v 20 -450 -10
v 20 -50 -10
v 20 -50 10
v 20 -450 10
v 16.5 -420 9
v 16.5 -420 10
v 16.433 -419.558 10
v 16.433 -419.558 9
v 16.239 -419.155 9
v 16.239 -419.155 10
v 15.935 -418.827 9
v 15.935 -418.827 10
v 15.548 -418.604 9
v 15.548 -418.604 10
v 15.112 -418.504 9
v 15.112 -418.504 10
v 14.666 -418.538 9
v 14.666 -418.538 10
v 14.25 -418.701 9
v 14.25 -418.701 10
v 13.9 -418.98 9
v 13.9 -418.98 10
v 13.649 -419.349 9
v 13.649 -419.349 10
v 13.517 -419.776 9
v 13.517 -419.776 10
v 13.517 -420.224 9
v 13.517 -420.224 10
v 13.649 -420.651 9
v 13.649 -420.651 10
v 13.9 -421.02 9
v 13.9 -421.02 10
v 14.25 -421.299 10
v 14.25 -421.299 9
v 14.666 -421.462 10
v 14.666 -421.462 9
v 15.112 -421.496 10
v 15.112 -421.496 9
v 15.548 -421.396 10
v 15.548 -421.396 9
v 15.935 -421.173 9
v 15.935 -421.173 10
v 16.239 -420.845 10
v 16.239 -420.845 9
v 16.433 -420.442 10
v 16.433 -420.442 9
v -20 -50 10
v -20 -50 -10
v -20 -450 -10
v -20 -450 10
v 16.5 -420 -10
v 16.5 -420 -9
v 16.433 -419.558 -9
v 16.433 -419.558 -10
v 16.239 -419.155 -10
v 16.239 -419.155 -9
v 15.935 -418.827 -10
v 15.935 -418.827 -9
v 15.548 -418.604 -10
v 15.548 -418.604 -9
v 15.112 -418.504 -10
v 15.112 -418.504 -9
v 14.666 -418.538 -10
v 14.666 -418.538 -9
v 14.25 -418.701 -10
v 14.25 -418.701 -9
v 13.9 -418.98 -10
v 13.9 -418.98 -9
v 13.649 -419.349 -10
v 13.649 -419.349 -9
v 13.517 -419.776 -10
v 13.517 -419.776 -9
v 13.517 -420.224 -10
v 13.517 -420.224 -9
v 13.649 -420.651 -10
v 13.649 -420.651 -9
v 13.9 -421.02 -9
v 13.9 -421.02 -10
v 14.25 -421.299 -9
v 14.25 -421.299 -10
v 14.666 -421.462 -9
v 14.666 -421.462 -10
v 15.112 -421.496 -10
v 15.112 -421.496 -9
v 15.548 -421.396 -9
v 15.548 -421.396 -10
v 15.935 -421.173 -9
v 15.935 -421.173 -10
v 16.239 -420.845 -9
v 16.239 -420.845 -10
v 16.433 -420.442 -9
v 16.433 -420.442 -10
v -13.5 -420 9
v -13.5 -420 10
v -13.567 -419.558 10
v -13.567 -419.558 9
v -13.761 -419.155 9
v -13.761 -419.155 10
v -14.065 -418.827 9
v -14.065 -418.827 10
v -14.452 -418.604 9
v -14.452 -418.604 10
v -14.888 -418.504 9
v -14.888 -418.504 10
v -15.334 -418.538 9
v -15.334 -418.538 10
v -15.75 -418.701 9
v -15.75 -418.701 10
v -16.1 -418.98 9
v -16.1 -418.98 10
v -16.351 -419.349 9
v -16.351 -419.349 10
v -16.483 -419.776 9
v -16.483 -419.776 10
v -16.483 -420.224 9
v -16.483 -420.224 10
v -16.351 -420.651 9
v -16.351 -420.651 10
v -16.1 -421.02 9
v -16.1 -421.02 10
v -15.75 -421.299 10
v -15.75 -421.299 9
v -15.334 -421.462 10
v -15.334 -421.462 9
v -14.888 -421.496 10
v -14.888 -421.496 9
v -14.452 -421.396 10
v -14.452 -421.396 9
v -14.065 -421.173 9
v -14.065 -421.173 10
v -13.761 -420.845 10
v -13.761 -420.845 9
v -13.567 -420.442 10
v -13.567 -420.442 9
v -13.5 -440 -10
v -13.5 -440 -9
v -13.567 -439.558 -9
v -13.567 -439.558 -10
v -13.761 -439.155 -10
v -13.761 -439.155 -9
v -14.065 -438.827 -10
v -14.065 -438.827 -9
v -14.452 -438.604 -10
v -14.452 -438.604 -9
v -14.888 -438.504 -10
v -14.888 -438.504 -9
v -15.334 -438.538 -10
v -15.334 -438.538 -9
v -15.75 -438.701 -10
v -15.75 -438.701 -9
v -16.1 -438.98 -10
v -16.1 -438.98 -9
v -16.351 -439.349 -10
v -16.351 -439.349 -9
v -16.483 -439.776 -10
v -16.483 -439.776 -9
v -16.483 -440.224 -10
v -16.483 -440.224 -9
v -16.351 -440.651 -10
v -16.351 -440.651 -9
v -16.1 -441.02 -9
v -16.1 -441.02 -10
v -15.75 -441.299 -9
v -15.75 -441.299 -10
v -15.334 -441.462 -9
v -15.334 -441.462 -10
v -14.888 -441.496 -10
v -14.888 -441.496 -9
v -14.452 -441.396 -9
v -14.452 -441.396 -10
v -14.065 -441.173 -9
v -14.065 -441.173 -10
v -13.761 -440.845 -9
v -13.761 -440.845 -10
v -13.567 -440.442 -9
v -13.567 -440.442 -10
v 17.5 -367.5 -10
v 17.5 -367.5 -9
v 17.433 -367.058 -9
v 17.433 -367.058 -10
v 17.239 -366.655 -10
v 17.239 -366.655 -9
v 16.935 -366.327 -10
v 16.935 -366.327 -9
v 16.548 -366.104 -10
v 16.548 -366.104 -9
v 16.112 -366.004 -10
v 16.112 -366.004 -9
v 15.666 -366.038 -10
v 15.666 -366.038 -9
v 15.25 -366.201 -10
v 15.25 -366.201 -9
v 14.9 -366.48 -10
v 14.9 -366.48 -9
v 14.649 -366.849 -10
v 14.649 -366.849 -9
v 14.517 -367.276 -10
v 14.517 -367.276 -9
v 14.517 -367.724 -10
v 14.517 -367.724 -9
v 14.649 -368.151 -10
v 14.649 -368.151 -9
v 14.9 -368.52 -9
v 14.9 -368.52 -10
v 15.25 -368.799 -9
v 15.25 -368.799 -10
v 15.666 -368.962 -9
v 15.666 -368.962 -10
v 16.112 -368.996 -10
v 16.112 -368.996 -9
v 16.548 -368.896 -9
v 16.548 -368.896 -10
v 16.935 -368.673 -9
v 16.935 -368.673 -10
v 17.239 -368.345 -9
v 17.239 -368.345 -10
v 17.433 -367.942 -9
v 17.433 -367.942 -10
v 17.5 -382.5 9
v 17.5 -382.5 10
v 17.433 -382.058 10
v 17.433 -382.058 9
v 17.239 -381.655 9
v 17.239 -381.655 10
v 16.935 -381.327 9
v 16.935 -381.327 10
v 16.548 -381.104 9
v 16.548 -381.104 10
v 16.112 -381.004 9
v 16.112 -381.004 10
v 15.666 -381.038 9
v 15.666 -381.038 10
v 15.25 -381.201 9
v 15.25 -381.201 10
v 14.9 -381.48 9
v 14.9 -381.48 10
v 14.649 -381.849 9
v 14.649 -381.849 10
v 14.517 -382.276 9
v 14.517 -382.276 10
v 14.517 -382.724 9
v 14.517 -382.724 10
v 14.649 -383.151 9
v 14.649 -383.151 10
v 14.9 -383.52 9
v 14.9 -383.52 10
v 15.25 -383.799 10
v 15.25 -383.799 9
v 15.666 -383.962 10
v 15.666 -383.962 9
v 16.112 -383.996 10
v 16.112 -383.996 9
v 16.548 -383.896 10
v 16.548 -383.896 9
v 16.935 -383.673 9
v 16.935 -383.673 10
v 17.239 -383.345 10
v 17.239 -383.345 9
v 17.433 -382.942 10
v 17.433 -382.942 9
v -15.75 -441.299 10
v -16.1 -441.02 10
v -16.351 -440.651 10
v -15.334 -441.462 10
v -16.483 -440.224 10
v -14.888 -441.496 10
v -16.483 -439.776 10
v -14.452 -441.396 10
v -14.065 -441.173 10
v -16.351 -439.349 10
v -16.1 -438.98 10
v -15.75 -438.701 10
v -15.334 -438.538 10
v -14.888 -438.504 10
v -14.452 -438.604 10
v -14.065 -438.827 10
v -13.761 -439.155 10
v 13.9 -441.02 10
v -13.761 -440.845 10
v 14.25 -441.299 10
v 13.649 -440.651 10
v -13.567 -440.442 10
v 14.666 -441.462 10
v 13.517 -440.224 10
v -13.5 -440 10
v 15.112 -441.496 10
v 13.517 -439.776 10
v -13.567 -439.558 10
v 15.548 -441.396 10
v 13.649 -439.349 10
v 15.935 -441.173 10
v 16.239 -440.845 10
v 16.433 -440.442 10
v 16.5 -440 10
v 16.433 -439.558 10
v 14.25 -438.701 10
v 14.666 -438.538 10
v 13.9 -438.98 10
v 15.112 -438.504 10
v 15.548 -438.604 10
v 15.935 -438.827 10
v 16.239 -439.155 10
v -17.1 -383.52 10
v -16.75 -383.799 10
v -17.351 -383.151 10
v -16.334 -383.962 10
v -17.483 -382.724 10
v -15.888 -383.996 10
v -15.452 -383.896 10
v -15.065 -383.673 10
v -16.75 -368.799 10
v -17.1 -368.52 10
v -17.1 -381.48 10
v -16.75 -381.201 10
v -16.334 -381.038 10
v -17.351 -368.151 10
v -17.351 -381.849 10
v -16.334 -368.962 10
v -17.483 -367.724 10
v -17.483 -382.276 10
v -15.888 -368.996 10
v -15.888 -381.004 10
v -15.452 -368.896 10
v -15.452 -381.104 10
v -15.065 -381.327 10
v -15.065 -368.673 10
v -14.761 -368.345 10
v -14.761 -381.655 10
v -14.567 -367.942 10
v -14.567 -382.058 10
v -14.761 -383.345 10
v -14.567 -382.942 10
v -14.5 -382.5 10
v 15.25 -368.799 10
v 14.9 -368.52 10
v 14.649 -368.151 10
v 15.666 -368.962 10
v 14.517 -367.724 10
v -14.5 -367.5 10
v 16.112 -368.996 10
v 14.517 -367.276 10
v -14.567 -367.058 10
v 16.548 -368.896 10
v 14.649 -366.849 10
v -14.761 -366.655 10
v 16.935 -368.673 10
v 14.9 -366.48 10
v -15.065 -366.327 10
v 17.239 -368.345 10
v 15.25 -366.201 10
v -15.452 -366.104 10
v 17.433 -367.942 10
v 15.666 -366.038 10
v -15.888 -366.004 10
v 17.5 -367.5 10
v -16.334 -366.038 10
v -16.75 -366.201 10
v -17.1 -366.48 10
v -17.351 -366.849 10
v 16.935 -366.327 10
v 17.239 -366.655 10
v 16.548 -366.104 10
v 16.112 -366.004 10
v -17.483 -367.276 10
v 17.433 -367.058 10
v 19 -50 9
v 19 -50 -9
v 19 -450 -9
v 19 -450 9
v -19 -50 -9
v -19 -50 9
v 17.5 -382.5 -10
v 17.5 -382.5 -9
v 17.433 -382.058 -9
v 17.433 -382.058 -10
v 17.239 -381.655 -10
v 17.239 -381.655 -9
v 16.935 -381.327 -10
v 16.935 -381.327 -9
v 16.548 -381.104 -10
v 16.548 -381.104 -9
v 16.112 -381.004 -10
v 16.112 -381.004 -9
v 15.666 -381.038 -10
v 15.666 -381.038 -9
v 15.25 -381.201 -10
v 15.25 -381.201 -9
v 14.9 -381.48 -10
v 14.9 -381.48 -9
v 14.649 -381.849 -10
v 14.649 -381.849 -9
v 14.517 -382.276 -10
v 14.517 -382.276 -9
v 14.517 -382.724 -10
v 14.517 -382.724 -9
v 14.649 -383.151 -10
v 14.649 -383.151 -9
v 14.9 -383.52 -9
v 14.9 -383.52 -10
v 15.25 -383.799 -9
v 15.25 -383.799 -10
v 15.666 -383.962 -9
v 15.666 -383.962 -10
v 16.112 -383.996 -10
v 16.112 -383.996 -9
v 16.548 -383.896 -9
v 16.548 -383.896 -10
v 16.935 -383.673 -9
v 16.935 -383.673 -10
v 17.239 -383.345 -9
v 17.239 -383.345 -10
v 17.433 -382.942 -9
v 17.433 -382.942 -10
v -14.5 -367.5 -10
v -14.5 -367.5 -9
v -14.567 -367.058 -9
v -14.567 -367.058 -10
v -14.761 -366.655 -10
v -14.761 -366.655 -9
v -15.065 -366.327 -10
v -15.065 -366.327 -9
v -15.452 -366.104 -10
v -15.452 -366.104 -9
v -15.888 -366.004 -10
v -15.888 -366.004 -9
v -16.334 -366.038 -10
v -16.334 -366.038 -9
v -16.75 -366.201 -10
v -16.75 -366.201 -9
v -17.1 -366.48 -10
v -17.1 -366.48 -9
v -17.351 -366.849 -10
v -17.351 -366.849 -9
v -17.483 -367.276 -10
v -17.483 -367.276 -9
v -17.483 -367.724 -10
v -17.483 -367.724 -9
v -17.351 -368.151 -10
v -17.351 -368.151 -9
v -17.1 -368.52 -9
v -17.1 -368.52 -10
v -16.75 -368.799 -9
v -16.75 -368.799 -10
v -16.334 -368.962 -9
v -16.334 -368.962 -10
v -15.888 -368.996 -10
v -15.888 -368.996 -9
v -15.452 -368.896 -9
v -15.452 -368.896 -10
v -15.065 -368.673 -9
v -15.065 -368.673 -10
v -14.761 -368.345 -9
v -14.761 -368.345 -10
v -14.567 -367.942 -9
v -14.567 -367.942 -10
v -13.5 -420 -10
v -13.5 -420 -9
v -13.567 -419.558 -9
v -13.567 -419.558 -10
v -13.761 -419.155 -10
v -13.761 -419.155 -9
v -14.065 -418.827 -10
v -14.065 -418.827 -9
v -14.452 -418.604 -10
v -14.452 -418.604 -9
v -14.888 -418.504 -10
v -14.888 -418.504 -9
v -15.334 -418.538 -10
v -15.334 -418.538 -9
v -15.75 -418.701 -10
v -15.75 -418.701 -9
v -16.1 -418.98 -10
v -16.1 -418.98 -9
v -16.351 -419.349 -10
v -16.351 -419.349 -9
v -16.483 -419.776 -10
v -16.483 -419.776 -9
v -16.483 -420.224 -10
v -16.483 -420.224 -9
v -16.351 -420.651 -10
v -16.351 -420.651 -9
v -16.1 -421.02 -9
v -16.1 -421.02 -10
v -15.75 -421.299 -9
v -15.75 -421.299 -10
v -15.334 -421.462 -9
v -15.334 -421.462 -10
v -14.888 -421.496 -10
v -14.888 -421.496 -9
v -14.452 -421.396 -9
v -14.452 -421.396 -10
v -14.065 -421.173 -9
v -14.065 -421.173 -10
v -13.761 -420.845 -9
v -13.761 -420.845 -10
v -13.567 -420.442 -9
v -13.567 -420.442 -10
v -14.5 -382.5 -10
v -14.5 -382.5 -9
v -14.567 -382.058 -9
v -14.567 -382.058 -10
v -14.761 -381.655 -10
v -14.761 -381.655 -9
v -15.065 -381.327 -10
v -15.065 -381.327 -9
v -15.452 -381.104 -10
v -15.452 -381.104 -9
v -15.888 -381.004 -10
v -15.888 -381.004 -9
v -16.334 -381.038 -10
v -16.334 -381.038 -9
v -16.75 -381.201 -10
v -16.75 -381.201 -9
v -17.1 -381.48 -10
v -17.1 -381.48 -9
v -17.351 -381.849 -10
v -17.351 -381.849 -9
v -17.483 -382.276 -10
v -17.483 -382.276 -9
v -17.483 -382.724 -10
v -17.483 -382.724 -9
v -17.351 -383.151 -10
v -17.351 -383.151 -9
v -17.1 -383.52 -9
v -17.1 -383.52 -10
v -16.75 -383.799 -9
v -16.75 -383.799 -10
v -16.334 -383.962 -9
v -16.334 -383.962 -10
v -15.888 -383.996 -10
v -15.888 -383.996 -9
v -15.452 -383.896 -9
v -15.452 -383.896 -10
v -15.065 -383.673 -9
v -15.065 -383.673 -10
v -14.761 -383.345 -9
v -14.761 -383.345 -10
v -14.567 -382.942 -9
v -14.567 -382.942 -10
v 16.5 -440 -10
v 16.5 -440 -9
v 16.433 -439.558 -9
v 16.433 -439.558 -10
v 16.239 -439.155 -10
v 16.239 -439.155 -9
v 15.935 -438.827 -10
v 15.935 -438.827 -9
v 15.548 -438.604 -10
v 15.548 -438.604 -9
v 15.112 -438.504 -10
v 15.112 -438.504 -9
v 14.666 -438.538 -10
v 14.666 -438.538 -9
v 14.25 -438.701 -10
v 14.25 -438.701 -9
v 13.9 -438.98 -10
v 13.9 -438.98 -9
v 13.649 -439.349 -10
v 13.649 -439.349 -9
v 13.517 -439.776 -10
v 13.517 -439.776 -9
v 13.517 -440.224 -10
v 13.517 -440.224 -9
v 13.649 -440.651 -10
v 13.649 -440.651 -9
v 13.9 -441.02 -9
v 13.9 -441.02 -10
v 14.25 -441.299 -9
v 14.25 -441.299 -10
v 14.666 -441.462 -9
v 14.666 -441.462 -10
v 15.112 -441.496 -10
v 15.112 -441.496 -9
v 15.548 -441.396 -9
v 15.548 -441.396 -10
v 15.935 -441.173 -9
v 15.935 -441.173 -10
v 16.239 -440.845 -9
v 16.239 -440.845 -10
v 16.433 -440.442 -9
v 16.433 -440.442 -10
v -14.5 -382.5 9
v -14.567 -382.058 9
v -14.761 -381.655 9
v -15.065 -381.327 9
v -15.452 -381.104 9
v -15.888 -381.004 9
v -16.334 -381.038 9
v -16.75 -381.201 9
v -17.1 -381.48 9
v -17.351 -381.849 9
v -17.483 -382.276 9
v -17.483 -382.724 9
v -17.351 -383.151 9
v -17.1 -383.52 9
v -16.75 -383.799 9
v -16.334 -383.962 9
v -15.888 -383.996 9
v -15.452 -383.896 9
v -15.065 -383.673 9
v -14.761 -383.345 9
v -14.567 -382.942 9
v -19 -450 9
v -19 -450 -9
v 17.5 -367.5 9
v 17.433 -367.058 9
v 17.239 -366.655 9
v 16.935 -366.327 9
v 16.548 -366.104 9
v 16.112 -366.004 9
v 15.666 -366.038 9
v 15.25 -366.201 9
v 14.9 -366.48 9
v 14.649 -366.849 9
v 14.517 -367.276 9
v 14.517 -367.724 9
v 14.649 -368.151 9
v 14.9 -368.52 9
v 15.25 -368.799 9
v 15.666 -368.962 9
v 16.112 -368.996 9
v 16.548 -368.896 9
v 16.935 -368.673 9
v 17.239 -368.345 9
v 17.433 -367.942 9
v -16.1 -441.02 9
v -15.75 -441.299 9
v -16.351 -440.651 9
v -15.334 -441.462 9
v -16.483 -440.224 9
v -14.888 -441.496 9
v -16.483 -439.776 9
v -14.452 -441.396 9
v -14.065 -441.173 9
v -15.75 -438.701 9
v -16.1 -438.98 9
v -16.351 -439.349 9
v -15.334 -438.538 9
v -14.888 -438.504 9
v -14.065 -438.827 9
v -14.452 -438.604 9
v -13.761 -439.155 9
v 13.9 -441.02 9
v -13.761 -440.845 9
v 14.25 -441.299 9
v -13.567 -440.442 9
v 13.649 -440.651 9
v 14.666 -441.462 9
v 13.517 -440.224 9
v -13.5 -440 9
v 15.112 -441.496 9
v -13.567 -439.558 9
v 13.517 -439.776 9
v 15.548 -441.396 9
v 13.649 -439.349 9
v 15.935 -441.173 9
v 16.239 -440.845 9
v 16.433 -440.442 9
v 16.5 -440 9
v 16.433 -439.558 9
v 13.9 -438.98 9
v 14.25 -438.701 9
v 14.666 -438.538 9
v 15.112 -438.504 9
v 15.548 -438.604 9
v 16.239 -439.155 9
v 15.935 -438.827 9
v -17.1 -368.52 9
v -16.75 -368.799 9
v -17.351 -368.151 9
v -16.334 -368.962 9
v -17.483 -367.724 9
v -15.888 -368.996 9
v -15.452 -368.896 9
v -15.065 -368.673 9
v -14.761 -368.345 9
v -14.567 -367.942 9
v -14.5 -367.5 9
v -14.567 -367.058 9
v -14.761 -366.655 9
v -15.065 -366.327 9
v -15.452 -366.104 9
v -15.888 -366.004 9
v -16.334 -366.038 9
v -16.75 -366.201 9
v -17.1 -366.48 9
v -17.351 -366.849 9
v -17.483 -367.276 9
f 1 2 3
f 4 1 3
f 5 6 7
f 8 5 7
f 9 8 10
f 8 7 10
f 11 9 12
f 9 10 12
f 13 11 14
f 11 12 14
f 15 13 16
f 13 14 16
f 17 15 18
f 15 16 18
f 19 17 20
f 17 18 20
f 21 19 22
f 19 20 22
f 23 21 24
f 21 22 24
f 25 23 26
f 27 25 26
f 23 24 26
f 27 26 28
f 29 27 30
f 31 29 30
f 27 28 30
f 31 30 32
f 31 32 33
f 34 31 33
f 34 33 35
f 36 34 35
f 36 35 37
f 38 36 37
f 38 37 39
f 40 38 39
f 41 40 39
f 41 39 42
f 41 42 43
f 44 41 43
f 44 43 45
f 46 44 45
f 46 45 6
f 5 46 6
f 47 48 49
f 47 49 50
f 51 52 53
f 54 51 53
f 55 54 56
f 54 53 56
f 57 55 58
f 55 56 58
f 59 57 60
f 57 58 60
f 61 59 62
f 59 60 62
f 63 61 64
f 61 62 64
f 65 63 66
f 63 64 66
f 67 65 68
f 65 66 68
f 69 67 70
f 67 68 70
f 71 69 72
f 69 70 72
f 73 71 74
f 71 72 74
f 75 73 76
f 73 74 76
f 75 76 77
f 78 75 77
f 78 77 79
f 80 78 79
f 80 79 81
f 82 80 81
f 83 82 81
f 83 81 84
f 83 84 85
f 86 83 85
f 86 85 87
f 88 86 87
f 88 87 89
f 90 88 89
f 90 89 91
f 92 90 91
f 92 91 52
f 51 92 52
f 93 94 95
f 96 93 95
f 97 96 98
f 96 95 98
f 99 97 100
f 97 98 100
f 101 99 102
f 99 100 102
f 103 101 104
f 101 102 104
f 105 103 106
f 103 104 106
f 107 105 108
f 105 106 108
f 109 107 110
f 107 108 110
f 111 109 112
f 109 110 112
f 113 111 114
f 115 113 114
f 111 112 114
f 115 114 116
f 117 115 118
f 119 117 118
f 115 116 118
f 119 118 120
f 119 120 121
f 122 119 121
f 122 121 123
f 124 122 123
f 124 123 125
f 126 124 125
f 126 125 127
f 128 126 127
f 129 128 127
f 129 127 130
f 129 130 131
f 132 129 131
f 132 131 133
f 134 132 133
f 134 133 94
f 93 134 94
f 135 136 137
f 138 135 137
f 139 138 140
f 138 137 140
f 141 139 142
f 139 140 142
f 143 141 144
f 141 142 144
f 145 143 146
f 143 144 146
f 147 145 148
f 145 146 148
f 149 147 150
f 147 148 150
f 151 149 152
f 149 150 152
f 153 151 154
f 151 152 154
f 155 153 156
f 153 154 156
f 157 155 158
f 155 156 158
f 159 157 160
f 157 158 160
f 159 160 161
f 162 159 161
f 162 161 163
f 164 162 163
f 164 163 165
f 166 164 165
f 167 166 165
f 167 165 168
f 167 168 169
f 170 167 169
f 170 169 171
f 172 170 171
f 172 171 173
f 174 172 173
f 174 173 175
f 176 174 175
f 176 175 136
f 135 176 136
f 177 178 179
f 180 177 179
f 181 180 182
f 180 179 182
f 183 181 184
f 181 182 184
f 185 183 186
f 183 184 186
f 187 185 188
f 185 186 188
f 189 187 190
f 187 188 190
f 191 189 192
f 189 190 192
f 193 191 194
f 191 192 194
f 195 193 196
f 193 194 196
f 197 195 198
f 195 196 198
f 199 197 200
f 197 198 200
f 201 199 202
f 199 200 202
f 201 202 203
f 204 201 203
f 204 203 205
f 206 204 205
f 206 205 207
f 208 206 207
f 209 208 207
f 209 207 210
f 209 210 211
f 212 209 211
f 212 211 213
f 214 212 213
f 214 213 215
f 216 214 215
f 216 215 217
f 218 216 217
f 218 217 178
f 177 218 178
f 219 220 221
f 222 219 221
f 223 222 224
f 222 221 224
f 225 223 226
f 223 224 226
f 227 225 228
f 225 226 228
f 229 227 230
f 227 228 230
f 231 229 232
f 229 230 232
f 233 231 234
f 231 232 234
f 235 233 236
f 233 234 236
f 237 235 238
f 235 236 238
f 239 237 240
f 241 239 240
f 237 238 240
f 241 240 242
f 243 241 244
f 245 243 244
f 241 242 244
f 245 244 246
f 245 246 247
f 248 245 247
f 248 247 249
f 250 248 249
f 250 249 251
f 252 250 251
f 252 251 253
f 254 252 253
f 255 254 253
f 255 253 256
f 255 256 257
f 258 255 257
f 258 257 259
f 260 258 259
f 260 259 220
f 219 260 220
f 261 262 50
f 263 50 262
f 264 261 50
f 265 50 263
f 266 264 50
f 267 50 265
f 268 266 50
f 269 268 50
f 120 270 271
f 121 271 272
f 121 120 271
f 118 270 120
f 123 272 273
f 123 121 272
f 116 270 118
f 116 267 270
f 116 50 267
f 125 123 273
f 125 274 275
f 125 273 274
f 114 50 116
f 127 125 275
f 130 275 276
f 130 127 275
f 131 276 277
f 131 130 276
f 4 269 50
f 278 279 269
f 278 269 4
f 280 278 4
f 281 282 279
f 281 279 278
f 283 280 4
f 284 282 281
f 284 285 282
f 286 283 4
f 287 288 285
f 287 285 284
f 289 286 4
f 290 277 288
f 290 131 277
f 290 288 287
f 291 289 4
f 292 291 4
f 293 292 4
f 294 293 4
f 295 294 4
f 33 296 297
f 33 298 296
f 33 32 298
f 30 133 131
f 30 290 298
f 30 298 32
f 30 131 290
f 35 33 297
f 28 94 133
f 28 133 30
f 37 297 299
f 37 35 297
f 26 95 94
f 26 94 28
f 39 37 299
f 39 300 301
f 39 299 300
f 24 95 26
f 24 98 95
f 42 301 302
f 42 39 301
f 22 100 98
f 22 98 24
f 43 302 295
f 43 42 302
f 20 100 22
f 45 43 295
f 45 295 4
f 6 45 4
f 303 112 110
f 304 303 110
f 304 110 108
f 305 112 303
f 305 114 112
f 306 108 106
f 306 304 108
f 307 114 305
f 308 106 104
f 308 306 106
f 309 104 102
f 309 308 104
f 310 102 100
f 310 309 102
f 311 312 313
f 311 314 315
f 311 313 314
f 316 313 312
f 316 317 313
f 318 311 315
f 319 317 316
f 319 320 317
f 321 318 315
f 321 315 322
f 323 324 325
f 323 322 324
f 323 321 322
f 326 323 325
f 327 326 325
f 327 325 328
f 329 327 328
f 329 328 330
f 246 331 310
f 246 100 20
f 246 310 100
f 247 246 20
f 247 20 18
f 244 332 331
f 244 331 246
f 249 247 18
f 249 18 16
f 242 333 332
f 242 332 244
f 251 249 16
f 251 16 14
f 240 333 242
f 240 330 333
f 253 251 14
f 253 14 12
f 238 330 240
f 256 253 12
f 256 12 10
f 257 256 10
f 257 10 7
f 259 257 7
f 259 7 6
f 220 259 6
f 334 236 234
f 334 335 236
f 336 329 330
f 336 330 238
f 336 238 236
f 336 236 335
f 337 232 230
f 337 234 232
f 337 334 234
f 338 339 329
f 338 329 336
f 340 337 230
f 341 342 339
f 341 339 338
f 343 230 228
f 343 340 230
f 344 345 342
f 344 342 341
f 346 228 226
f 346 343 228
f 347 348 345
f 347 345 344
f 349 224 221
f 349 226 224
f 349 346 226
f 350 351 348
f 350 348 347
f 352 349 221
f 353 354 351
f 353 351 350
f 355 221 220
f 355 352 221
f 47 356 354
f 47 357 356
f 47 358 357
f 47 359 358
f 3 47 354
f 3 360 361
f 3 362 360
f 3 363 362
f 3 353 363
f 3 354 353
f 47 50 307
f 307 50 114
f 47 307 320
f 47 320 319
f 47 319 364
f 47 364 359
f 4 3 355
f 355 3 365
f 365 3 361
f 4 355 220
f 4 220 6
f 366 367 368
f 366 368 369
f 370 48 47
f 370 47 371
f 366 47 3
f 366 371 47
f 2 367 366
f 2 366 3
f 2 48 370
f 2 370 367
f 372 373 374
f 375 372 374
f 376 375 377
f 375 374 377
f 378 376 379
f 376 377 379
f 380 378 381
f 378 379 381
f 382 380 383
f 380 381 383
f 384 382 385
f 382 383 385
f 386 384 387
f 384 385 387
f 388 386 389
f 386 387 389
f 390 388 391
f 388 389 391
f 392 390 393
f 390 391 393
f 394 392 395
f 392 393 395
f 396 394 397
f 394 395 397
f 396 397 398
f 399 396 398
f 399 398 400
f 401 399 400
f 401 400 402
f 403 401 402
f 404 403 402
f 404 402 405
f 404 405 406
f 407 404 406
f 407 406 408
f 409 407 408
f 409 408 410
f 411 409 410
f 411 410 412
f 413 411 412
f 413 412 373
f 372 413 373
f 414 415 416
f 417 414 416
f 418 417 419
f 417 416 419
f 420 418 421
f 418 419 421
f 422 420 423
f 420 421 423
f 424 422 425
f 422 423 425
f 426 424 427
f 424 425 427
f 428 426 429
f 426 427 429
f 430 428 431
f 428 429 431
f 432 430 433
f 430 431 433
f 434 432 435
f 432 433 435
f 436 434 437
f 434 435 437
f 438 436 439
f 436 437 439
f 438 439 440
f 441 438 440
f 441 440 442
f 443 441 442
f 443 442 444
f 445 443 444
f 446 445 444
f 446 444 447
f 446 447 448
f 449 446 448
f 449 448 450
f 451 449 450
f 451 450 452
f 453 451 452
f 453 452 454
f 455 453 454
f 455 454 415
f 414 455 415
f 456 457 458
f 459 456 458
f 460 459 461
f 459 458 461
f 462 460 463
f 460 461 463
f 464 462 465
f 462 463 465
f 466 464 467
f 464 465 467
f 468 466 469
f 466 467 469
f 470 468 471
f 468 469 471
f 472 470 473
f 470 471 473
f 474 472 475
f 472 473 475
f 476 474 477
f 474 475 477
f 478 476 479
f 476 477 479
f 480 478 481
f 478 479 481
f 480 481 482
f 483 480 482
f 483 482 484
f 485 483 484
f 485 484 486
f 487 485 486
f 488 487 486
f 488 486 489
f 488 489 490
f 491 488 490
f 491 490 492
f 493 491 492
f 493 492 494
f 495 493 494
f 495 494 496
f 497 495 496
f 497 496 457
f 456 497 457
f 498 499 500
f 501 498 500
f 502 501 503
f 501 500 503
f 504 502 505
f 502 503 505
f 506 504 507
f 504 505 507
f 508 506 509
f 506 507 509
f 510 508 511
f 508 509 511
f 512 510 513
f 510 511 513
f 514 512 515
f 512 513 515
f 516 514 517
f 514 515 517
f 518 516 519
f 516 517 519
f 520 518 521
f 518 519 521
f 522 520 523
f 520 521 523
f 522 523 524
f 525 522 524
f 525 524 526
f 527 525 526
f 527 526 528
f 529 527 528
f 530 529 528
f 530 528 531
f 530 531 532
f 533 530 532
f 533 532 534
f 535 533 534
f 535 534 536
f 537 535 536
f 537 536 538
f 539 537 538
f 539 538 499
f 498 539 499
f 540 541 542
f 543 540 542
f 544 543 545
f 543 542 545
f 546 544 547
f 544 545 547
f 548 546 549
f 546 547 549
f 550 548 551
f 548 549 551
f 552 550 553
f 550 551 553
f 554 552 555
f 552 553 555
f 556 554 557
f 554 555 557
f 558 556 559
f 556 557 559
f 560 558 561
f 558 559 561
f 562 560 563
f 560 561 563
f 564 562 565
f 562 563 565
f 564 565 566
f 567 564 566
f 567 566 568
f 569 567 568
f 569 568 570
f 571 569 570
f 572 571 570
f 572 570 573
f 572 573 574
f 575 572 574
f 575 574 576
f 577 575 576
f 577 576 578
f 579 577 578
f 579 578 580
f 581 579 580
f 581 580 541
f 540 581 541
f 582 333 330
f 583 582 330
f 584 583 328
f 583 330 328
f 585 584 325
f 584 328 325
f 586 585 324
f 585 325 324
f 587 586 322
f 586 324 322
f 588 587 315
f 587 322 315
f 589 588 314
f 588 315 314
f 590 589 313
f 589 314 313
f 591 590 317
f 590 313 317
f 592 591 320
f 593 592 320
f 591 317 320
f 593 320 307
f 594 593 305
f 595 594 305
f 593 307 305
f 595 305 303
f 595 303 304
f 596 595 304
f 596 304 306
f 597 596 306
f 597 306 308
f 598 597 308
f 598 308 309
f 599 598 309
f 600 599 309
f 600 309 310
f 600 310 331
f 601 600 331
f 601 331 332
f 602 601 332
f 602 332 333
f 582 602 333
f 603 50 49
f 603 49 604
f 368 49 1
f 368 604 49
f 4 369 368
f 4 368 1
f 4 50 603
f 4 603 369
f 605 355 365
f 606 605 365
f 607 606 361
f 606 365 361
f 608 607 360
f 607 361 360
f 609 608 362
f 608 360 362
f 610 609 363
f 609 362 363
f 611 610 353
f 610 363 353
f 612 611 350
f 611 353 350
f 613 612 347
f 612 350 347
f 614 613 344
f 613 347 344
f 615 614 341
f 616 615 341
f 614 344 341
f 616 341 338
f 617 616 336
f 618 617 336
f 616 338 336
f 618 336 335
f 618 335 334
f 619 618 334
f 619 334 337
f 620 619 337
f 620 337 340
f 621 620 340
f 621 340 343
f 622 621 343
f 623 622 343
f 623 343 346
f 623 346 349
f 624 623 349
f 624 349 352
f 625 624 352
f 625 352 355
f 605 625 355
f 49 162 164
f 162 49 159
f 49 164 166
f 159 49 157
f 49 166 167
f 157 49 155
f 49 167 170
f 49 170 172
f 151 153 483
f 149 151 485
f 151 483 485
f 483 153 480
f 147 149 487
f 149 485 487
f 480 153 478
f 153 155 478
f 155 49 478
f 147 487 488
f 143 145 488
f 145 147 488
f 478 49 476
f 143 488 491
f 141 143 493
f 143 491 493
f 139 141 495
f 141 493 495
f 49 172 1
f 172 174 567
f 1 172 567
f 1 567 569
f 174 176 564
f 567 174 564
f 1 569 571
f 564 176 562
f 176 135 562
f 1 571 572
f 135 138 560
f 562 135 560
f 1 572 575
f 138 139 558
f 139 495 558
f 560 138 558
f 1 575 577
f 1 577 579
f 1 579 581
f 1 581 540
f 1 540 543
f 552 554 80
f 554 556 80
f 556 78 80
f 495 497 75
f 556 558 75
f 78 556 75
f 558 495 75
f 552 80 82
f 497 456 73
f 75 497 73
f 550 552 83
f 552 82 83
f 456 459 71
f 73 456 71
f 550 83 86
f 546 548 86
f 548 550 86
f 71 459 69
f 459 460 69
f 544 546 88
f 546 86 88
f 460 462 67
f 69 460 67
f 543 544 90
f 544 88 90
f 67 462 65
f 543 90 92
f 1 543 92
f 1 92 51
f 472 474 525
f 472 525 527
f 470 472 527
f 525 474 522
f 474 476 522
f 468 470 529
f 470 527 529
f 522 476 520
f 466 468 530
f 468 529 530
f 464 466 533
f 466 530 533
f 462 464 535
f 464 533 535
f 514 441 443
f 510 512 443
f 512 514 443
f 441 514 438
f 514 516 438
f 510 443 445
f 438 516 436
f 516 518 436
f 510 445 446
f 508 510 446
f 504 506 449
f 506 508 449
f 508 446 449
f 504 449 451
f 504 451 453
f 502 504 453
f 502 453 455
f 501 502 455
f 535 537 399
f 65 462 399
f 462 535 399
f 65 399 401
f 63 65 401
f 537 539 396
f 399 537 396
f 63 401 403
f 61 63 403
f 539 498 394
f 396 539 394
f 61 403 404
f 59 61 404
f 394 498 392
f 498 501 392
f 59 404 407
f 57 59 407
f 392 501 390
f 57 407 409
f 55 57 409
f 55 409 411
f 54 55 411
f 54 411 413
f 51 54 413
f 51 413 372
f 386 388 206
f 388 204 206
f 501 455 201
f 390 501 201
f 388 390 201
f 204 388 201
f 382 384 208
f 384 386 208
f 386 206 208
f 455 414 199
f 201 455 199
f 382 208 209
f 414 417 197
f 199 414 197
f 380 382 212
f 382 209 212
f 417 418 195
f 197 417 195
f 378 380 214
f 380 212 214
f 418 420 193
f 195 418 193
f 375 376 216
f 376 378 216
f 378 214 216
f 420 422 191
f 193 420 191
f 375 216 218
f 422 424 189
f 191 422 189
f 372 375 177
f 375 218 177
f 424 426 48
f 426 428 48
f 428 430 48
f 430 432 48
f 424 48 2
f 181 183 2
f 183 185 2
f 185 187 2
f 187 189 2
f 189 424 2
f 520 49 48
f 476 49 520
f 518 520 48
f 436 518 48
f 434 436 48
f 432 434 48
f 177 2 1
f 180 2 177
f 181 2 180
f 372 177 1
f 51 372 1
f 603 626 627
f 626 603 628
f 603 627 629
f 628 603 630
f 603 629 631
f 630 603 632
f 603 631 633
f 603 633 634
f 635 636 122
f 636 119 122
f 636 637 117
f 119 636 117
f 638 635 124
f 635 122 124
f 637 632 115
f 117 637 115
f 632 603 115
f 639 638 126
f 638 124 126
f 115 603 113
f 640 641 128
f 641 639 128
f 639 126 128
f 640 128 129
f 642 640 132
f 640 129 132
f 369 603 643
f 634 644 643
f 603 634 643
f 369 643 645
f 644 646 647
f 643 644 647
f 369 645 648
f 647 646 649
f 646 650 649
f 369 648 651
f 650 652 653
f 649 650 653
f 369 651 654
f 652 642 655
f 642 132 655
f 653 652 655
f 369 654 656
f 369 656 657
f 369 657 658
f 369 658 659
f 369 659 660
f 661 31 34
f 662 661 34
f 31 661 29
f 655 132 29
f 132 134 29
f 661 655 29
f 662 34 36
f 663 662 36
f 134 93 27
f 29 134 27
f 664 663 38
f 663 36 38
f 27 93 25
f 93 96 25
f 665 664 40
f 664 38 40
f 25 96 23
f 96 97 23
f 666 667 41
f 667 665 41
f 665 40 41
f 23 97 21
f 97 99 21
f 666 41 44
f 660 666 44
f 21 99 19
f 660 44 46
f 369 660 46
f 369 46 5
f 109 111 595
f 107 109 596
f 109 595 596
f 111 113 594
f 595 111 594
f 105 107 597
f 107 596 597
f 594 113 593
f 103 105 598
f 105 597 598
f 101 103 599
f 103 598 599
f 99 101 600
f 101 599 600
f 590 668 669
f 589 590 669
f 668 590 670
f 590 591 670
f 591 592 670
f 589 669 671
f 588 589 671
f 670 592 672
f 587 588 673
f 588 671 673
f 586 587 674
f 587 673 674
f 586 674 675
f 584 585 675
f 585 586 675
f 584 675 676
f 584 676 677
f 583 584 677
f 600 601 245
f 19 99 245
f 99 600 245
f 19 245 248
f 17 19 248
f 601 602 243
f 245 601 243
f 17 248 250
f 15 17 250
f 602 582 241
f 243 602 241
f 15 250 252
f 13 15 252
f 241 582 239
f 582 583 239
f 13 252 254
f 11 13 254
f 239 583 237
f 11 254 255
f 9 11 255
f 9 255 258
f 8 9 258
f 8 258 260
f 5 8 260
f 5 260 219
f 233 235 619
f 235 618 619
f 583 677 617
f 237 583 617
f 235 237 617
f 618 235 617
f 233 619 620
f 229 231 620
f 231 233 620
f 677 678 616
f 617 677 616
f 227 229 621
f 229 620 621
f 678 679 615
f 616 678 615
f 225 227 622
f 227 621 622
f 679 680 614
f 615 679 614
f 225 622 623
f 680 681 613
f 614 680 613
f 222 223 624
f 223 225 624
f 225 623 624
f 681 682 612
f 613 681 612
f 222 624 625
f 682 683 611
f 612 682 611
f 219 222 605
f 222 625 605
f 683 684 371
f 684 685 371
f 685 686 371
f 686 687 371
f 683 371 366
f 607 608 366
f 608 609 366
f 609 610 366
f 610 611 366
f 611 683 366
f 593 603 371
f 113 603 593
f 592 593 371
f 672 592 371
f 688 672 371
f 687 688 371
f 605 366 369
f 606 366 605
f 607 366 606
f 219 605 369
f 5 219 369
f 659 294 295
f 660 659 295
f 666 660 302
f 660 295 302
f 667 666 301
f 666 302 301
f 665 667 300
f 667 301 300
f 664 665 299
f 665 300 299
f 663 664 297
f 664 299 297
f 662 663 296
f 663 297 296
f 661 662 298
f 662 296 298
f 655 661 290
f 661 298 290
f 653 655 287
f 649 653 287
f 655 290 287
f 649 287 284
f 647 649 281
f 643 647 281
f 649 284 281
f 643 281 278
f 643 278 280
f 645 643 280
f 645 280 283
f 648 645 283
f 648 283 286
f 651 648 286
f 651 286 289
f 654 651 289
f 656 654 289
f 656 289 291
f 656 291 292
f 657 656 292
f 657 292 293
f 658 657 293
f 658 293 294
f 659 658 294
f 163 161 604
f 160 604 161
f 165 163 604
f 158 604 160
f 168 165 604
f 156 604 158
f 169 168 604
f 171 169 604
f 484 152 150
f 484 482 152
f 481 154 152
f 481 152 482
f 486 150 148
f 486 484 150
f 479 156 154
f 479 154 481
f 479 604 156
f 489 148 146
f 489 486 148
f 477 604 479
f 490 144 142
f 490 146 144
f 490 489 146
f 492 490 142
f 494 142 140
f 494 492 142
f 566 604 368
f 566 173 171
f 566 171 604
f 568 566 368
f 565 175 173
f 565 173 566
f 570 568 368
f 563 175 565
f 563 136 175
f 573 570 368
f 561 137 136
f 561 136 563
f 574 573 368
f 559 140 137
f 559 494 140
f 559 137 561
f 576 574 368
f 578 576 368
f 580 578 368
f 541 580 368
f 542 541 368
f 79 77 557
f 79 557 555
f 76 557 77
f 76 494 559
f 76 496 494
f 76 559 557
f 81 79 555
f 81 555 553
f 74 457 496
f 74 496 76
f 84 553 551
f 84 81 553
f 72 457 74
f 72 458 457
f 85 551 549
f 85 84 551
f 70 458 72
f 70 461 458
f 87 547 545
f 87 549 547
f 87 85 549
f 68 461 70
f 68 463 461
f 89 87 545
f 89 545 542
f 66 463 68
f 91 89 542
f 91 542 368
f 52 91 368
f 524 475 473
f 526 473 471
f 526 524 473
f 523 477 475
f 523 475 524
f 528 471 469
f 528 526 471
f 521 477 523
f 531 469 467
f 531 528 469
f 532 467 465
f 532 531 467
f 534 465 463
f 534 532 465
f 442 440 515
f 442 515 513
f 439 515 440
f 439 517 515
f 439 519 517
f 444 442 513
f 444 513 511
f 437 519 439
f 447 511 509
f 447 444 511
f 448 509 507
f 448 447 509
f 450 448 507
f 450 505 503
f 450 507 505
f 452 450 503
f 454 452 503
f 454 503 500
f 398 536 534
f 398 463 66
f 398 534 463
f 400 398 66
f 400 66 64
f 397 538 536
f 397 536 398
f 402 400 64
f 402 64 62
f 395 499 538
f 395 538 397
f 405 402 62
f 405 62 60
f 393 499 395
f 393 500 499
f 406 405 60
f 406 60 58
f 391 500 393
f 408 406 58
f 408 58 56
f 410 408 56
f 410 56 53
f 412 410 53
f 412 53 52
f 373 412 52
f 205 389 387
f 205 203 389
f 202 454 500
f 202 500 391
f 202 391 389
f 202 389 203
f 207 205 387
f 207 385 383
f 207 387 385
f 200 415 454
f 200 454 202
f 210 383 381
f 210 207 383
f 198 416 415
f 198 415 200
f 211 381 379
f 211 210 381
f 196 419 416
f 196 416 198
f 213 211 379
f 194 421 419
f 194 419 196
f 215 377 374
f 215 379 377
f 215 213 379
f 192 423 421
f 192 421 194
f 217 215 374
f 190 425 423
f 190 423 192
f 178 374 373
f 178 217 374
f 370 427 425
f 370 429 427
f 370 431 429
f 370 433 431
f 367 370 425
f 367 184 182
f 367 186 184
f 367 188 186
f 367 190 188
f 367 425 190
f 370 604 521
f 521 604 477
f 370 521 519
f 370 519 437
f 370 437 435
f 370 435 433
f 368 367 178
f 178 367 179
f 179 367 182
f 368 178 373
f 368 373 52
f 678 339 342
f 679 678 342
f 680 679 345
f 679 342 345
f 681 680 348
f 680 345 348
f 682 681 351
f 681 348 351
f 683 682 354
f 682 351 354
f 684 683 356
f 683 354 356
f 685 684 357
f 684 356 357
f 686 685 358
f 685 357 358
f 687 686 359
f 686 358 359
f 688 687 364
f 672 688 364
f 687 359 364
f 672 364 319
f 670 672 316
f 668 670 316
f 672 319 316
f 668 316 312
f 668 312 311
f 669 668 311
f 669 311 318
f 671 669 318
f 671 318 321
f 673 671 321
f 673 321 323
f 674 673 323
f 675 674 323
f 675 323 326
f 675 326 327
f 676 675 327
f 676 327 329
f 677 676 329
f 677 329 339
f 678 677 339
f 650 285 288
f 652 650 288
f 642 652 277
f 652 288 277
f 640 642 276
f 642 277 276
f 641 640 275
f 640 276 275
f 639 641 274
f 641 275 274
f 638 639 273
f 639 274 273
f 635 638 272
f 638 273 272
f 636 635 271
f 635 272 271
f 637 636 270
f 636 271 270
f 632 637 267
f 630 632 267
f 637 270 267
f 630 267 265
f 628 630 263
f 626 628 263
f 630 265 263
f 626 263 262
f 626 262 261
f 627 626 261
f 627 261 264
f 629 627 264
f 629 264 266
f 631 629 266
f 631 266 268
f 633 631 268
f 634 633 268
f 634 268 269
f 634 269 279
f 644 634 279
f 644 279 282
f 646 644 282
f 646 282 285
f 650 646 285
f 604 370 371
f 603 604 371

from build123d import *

# Parameters (mm, degrees)
SKETCH_12_W                   = 40
SKETCH_12_H                   = 20
SKETCH_12_W_2                 = 38
SKETCH_12_H_2                 = 18
F_20X40X1_LVGUAN20X40_1_DEPTH = 450
SKETCH_13_R                   = 1.5
CUT_EXTRUDE_1_DEPTH           = 51
SKETCH_14_W                   = 50.928856462
SKETCH_14_H                   = 27.036577468
CUT_EXTRUDE_2_DEPTH           = 50


with BuildPart() as part:
    # 草图12 → 20x40x1 LVGUAN20X40(1) (new body)
    with BuildSketch(Plane.XZ):
        Rectangle(SKETCH_12_W, SKETCH_12_H)
        Rectangle(SKETCH_12_W_2, SKETCH_12_H_2, mode=Mode.SUBTRACT)
    extrude(amount=F_20X40X1_LVGUAN20X40_1_DEPTH)

    # 草图13 → 切除-拉伸1 (cut)
    with BuildSketch(Plane.XY.offset(10)):
        with Locations((16, -382.5)):
            Circle(SKETCH_13_R)
        with Locations((16, -367.5)):
            Circle(SKETCH_13_R)
        with Locations((-16, -367.5)):
            Circle(SKETCH_13_R)
        with Locations((-16, -382.5)):
            Circle(SKETCH_13_R)
        with Locations((15, -420)):
            Circle(SKETCH_13_R)
        with Locations((-15, -420)):
            Circle(SKETCH_13_R)
        with Locations((-15, -440)):
            Circle(SKETCH_13_R)
        with Locations((15, -440)):
            Circle(SKETCH_13_R)
    extrude(amount=-CUT_EXTRUDE_1_DEPTH, mode=Mode.SUBTRACT)

    # 草图14 → 切除-拉伸2 (cut)
    with BuildSketch(Plane(origin=(0, 0, 0), x_dir=(1, 0, 0), z_dir=(0, 1, 0))):
        Rectangle(SKETCH_14_W, SKETCH_14_H)
    extrude(amount=-CUT_EXTRUDE_2_DEPTH, mode=Mode.SUBTRACT)


solid = part.part
